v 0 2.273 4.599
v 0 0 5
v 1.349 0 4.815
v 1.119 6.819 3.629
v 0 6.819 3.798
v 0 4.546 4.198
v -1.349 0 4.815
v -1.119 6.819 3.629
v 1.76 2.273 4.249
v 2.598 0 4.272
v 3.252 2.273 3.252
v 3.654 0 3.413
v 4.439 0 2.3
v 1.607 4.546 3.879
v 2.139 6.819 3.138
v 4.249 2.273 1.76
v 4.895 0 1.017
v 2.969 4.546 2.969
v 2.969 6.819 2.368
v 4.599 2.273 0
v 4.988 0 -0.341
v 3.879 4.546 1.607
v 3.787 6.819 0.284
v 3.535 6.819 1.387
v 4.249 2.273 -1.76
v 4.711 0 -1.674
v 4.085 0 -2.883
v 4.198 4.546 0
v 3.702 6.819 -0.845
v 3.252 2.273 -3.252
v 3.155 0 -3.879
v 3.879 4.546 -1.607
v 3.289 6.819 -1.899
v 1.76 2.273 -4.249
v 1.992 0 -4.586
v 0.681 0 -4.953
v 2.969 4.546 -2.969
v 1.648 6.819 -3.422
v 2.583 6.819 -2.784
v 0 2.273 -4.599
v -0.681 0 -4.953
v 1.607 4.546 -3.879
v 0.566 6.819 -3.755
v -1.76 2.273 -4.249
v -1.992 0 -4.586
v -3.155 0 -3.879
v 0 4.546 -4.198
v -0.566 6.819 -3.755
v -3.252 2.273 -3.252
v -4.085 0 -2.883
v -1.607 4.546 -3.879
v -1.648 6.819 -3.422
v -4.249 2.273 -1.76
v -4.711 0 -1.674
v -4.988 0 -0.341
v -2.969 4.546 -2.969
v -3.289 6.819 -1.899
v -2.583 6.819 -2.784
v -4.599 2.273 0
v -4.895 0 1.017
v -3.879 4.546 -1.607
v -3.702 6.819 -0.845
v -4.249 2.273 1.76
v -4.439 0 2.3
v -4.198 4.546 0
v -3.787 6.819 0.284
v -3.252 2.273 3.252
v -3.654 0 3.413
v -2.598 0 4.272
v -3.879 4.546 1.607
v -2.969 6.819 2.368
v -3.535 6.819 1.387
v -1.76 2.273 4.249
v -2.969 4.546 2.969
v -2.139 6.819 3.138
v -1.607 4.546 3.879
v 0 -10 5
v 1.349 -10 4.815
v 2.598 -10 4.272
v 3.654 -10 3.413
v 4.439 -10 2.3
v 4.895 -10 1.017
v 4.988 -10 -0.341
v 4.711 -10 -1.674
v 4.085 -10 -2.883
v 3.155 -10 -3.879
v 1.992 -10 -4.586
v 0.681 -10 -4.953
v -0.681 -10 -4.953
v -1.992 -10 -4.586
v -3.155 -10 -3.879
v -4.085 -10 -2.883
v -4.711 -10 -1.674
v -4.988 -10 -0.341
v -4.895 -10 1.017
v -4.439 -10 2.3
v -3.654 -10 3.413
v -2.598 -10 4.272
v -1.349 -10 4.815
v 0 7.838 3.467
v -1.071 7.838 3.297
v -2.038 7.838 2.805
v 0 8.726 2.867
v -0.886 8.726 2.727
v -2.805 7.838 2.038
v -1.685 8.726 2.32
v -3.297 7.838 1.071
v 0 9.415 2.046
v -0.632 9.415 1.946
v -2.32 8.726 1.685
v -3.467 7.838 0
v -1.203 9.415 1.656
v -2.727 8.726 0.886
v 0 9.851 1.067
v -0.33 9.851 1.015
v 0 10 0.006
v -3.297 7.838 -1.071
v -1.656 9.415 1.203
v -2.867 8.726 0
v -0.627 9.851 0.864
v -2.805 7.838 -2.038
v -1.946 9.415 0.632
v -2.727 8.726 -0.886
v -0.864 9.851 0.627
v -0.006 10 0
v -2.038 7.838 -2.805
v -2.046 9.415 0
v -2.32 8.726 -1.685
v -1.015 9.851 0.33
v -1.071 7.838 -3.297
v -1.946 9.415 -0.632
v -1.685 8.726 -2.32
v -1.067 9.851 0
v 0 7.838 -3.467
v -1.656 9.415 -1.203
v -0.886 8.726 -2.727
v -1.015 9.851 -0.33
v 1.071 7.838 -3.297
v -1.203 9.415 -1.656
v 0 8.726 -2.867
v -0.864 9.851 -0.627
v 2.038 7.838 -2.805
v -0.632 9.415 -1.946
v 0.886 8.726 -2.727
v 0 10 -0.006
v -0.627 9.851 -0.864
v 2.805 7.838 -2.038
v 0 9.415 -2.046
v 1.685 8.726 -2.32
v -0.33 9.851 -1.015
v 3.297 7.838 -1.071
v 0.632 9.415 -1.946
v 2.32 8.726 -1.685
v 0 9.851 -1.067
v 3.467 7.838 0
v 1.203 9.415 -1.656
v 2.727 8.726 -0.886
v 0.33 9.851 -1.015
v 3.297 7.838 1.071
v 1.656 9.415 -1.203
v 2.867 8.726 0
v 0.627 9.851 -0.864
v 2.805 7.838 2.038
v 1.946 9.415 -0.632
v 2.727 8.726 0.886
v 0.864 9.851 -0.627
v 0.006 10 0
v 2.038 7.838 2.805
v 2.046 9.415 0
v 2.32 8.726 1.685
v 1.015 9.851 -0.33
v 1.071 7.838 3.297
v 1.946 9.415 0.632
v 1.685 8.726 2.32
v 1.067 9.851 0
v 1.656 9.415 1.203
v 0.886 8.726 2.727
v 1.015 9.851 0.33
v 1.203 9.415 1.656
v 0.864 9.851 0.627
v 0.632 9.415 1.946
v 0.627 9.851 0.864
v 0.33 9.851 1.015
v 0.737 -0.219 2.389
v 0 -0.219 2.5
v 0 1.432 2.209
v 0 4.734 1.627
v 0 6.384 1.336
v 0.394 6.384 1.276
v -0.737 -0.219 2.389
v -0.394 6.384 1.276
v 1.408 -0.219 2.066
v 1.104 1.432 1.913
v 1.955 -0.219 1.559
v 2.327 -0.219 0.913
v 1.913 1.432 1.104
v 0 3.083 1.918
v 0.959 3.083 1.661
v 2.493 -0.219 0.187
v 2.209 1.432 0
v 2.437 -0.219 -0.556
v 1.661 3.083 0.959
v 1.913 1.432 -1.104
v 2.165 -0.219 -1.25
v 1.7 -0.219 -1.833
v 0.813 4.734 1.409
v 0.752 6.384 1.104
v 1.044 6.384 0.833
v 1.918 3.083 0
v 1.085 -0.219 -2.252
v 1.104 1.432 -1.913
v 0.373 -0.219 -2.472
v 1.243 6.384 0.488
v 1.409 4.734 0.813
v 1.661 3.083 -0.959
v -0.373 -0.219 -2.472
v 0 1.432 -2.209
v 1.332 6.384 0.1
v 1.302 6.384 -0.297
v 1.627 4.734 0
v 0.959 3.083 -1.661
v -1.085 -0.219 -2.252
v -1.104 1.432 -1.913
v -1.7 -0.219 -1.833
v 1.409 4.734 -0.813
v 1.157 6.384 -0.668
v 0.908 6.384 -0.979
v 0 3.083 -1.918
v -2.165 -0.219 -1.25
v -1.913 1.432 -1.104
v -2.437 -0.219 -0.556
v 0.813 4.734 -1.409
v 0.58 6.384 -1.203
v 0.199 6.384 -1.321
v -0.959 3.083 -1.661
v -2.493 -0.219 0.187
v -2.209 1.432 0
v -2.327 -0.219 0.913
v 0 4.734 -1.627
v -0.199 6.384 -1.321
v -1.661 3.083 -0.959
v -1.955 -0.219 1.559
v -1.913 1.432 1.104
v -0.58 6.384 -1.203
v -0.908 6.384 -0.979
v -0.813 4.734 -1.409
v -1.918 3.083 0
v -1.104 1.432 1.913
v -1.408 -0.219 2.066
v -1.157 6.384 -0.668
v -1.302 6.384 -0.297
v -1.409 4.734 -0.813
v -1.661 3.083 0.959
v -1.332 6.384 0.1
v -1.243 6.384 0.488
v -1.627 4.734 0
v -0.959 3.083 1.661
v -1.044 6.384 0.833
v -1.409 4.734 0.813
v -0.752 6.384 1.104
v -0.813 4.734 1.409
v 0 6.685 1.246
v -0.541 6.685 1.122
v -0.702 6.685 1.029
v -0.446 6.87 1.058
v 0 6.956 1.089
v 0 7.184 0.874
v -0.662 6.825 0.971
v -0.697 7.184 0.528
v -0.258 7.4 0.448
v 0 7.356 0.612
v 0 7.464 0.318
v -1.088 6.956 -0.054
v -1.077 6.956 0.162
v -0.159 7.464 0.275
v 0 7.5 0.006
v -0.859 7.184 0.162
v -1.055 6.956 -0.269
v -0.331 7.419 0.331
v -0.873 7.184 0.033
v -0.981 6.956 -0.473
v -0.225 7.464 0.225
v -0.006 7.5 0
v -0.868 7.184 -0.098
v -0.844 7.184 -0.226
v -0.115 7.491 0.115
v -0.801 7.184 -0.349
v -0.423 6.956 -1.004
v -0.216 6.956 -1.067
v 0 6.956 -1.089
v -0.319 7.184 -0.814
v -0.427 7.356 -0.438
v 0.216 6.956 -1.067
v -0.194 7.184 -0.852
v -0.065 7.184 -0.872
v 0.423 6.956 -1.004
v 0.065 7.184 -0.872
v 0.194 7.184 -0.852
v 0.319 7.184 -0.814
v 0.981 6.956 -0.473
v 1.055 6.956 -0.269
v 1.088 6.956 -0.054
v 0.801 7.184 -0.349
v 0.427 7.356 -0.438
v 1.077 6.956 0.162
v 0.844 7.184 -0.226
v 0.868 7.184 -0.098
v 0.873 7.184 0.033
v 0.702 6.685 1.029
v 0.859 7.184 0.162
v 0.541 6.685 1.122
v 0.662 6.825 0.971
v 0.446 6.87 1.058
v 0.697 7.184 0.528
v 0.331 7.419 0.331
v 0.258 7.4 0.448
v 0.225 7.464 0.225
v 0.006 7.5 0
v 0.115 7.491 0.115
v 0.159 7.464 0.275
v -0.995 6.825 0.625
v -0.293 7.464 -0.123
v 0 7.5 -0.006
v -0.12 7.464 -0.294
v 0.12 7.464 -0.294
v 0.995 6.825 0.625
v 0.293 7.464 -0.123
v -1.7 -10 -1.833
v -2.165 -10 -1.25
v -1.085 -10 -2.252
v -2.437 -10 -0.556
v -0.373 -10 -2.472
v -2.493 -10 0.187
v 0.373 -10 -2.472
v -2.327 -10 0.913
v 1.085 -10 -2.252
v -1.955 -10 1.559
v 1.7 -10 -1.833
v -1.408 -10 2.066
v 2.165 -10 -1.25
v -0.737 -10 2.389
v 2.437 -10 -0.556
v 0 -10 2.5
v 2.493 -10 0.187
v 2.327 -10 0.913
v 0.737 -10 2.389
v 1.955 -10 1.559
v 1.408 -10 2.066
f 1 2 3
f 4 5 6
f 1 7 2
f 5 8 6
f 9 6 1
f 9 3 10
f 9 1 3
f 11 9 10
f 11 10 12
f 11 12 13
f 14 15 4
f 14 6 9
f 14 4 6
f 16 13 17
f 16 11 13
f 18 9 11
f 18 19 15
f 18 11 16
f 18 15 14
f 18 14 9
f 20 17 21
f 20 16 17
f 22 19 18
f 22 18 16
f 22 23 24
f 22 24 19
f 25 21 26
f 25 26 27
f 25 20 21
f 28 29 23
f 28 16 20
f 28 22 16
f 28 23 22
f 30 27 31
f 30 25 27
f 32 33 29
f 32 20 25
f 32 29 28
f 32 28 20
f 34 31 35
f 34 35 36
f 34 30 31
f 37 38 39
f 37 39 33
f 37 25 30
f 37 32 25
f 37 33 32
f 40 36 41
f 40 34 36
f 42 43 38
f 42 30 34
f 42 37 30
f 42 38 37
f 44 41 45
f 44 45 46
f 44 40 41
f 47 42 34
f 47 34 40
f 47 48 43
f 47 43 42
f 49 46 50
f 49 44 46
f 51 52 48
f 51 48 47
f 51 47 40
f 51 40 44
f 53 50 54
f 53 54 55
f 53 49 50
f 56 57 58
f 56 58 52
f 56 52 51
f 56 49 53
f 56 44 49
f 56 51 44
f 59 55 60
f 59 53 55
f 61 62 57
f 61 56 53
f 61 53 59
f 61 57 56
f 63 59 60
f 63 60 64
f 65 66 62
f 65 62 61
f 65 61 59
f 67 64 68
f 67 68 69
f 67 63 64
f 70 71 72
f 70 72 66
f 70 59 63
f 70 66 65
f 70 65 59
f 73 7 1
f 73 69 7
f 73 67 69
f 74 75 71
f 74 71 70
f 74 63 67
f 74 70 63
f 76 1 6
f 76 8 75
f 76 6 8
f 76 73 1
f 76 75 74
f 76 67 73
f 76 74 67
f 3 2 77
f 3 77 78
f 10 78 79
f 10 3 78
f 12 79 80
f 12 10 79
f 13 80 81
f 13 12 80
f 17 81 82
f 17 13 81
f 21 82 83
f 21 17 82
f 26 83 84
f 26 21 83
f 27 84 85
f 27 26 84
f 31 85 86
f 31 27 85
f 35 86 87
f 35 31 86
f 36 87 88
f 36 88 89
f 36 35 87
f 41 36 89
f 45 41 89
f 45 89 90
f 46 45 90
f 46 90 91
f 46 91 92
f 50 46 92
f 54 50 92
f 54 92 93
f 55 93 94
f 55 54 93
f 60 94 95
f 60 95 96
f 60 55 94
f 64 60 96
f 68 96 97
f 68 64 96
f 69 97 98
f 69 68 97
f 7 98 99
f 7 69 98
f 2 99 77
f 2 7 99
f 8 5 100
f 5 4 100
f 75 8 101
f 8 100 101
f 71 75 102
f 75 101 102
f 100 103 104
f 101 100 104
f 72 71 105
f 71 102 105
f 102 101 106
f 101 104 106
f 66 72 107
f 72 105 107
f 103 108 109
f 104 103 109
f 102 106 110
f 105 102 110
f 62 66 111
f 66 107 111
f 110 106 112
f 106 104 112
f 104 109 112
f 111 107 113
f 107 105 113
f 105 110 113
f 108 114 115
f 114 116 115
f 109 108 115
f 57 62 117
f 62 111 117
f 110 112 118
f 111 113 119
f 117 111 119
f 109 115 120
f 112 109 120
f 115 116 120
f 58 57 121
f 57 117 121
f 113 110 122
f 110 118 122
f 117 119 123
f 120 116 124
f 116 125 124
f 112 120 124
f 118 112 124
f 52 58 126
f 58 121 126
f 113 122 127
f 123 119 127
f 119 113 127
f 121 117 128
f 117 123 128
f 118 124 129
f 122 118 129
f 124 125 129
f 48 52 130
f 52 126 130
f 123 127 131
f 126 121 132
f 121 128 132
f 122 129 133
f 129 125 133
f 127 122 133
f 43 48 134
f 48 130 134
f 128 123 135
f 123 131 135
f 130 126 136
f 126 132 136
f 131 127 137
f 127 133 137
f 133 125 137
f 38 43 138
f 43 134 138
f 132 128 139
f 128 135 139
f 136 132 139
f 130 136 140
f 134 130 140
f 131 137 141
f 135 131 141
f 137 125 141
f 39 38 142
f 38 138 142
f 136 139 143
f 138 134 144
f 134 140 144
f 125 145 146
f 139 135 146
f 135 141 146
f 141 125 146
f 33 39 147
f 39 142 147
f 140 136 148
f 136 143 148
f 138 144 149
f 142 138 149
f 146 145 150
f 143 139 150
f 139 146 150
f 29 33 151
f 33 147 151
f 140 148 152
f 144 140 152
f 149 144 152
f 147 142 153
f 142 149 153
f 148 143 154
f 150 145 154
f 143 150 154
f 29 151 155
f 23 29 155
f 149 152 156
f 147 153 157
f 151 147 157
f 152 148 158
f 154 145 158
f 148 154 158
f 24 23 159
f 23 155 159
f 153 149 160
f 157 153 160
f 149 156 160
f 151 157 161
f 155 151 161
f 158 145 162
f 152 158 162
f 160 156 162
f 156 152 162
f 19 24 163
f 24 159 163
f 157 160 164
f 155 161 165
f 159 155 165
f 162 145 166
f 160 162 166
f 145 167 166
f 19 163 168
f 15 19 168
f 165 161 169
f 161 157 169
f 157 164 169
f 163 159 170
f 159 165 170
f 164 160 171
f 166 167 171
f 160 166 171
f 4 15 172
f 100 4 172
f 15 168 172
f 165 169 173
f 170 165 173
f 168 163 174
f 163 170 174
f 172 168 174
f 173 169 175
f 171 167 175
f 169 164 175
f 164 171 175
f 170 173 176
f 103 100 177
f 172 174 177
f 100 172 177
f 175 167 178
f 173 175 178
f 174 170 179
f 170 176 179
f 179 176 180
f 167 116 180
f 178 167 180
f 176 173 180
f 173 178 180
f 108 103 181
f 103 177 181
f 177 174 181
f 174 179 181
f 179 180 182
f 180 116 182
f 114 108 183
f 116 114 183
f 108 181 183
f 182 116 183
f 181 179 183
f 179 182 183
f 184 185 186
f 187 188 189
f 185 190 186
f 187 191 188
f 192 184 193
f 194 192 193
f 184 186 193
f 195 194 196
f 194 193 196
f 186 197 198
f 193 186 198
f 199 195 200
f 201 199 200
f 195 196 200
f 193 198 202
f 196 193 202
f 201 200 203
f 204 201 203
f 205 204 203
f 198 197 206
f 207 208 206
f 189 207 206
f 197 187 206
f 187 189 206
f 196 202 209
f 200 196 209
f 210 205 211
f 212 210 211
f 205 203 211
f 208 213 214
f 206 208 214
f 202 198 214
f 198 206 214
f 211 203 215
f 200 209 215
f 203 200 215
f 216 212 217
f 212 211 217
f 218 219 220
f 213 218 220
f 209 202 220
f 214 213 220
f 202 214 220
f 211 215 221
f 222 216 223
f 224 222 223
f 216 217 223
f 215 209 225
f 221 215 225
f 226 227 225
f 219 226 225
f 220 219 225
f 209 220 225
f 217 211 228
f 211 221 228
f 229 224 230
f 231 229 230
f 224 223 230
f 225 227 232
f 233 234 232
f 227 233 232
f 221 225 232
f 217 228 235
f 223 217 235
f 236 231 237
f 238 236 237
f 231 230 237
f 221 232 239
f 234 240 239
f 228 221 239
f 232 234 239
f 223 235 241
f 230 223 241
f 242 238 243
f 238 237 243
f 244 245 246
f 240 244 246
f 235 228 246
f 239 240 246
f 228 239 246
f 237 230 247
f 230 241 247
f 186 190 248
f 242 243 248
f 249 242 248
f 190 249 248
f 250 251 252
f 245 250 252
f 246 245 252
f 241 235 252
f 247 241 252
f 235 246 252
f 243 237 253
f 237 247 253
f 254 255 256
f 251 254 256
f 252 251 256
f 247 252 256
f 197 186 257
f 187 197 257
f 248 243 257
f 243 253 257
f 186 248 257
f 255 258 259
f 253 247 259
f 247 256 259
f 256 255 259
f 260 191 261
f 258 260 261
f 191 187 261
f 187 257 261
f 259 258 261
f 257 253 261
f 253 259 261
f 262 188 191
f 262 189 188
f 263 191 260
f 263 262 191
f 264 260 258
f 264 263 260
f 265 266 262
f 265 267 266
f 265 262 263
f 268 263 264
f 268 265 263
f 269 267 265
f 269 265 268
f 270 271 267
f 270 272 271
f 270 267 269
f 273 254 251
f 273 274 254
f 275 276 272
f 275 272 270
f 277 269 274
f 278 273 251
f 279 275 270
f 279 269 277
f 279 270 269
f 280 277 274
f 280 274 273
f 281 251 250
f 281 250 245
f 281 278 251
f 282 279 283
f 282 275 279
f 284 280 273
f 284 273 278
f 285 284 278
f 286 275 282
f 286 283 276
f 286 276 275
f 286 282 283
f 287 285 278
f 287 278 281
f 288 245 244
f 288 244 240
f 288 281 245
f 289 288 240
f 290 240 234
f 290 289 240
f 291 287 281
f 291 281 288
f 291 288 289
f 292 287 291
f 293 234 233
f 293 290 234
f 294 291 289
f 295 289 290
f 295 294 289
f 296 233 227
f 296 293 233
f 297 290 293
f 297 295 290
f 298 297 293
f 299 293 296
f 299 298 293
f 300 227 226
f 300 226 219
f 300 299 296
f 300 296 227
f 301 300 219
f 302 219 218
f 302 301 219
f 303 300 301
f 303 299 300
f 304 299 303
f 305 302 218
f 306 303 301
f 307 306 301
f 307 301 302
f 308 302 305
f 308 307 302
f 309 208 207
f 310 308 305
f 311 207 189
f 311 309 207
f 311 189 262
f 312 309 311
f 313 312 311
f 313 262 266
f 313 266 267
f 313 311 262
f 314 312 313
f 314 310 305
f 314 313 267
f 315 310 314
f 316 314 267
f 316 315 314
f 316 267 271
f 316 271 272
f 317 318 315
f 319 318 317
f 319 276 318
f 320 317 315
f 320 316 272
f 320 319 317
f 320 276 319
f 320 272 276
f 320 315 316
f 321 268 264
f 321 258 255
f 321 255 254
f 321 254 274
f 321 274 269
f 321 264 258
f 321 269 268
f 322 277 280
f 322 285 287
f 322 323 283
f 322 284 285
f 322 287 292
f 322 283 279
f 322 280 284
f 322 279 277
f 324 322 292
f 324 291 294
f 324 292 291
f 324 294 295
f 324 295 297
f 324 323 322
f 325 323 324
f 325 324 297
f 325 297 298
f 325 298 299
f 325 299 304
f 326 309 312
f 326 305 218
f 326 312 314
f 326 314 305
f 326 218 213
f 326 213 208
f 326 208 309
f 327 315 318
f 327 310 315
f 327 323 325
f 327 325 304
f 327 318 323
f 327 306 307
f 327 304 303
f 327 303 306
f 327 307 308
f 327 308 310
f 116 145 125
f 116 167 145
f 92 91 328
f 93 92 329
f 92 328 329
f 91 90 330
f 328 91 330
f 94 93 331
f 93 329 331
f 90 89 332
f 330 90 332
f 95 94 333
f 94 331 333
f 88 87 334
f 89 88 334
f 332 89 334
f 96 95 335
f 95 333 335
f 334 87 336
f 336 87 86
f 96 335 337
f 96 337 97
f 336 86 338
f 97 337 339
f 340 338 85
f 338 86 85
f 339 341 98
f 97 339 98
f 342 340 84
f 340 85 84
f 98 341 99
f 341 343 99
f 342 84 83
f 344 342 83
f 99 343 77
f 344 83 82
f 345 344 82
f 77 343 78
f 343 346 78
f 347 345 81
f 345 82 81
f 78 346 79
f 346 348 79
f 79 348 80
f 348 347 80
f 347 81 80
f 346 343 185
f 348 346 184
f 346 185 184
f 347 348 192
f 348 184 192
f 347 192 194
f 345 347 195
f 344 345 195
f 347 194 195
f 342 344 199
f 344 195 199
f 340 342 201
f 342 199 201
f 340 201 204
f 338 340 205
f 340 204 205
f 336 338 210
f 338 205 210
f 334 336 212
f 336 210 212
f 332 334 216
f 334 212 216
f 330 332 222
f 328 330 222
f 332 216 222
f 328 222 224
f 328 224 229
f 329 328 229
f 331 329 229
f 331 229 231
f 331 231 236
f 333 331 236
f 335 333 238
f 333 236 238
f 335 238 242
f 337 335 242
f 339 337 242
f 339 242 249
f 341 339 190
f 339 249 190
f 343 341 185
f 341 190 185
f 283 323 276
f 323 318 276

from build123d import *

# Parameters (mm, degrees)
SKETCH1_R                     = 5
BOSS_EXTRUDE1_DEPTH           = 10
BOSS_EXTRUDE1_OTHER_WAY_DEPTH = 10
BOSS_EXTRUDE1_OTHER_WAY_TAPER = 10
FILLET1_R                     = 3.85
SHELL1_T                      = -2.5


with BuildPart() as part:
    # Sketch1 → Boss-Extrude1 (new body)
    with BuildSketch(Plane(origin=(0, 0, 0), x_dir=(1, 0, 0), z_dir=(0, 1, 0))):
        with Locations(Location((0, 0, 0), (0, 0, 270))):
            Circle(SKETCH1_R)
    extrude(amount=-BOSS_EXTRUDE1_DEPTH)

    # Sketch1 → Boss-Extrude1 other way (add)
    with BuildSketch(Plane(origin=(0, 0, 0), x_dir=(1, 0, 0), z_dir=(0, 1, 0))):
        with Locations(Location((0, 0, 0), (0, 0, 270))):
            Circle(SKETCH1_R)
    extrude(amount=BOSS_EXTRUDE1_OTHER_WAY_DEPTH, taper=BOSS_EXTRUDE1_OTHER_WAY_TAPER)

    # Fillet1
    fillet1_edges = [part.edges().sort_by_distance(p)[0] for p in [
        (0, 10, -3.236730193),
    ]]
    fillet(fillet1_edges, radius=FILLET1_R)

    # Shell1
    shell1_openings = [part.faces().sort_by_distance(p)[0] for p in [
        (0, -10, 0),
    ]]
    offset(amount=SHELL1_T, openings=shell1_openings, kind=Kind.INTERSECTION)


solid = part.part
